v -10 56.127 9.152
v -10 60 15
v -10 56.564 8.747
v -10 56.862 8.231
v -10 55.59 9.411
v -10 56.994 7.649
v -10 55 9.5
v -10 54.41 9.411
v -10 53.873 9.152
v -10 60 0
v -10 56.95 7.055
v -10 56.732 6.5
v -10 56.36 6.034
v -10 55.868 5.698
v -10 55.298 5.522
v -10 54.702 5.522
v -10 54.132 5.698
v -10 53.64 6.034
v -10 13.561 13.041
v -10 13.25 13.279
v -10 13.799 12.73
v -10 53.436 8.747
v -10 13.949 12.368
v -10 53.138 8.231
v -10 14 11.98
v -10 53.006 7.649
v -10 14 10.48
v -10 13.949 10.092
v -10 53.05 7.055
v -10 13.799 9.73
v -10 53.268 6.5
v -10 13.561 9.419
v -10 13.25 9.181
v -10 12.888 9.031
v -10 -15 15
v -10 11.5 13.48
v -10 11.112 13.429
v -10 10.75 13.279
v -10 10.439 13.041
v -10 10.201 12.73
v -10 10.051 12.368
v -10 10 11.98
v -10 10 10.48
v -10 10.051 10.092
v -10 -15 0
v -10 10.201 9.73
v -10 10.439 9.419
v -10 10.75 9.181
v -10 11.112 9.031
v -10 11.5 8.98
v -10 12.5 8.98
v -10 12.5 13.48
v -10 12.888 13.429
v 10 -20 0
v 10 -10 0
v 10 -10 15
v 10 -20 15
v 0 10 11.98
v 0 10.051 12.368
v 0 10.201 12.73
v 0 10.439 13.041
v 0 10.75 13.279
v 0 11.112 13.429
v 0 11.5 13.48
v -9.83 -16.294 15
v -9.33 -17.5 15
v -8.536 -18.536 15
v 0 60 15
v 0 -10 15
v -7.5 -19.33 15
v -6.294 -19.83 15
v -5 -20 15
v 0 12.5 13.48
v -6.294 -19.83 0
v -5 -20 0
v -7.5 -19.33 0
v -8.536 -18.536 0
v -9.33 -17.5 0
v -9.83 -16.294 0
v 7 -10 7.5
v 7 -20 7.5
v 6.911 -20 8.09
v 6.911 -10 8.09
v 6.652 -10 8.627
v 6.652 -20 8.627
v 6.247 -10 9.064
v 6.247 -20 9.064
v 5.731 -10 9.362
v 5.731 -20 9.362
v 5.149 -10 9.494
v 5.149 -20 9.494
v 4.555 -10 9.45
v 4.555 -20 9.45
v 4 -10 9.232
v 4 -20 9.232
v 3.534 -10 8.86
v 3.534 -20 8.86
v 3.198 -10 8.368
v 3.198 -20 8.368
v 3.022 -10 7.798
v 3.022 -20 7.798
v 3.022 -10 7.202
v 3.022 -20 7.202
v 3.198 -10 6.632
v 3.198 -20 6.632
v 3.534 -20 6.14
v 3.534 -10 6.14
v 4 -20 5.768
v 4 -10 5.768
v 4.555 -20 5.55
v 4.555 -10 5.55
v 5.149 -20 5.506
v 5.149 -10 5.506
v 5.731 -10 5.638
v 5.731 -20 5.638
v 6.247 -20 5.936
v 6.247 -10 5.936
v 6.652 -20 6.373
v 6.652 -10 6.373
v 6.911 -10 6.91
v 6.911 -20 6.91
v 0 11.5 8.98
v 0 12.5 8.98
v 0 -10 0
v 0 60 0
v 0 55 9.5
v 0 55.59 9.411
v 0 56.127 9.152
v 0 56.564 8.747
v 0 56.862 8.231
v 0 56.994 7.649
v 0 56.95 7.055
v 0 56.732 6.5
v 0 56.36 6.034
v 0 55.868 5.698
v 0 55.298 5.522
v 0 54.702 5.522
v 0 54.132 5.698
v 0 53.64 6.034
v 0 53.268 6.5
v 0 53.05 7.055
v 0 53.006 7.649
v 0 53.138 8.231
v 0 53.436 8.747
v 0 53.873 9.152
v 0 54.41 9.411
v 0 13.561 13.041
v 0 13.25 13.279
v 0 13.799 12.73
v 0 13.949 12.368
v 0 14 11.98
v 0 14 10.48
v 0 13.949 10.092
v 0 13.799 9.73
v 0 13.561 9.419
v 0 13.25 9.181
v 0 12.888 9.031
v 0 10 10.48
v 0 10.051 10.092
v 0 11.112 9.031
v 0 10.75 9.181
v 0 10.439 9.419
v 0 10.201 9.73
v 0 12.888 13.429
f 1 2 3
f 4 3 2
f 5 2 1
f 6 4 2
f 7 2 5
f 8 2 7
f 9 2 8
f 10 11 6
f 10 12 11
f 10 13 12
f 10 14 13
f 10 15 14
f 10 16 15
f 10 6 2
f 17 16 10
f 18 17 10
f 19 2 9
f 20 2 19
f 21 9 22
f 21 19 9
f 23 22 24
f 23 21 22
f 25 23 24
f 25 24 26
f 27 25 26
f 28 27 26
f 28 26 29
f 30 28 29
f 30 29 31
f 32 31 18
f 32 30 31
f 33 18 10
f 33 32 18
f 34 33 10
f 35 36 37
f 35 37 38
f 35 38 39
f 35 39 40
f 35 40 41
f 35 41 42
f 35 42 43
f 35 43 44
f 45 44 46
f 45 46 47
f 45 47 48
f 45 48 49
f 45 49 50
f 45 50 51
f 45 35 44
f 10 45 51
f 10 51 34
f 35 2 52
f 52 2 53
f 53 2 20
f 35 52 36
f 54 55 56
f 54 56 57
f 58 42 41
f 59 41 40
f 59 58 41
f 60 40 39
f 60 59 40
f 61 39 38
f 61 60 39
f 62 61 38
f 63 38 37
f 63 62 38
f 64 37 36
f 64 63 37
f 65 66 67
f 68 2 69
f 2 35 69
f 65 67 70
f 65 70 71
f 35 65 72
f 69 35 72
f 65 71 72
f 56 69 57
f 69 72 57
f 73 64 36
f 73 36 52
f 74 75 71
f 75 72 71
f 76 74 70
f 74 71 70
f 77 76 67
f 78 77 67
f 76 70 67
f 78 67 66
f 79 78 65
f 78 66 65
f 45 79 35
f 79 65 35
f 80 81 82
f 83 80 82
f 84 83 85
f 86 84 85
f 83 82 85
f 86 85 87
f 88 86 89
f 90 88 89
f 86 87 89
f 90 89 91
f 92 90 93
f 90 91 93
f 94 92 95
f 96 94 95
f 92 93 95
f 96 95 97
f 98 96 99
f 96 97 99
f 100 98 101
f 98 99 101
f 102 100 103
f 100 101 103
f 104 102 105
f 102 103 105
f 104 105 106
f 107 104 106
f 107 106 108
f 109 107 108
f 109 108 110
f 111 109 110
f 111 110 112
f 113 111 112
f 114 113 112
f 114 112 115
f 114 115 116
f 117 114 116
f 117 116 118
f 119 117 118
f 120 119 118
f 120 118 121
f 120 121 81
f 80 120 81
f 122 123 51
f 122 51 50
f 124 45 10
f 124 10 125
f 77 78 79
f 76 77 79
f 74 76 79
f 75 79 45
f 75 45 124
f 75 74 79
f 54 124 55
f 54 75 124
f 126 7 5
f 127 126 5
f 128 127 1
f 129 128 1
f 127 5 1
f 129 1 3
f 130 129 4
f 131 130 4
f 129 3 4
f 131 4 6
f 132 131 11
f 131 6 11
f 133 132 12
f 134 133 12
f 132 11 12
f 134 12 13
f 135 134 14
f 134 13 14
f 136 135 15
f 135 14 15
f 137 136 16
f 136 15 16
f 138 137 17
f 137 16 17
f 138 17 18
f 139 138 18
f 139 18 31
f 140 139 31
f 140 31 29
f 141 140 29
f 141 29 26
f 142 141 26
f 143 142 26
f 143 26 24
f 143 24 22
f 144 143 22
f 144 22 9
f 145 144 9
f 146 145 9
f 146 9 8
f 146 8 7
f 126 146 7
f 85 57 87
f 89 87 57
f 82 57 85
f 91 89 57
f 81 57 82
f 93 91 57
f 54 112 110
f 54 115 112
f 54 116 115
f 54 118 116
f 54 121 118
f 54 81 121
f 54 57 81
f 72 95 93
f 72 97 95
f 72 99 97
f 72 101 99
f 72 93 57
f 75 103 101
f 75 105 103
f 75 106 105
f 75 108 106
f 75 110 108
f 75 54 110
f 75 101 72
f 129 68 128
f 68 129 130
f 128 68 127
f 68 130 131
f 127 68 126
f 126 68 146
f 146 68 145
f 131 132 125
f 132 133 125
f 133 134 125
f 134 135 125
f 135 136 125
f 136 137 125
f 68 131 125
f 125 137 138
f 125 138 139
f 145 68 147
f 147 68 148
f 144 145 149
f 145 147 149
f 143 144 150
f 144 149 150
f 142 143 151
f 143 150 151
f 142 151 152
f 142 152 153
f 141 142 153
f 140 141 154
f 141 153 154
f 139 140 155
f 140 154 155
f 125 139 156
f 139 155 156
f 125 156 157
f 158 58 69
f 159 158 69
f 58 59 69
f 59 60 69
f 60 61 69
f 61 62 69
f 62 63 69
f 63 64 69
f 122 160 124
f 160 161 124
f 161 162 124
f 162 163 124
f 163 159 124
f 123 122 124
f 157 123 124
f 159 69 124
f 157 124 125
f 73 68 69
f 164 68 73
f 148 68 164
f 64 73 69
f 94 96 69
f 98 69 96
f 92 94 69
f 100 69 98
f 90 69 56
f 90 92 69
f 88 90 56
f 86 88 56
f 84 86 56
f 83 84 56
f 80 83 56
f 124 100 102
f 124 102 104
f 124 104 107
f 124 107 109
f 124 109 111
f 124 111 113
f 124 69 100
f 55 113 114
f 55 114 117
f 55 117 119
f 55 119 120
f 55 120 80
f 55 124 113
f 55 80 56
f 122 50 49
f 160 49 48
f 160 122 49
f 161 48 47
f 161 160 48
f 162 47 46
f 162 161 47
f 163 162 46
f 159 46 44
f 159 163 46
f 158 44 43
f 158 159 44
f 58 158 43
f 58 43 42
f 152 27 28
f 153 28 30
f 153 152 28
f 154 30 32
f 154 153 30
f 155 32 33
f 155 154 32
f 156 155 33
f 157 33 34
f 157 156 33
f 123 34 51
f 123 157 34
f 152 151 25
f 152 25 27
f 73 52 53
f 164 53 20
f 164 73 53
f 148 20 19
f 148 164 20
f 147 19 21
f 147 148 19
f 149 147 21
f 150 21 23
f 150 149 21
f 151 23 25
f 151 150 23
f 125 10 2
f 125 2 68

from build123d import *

# Parameters (mm, degrees)
BOSS_EXTRUDE1_DEPTH = 15
FILLET1_R           = 5
SKETCH2_W           = 10
SKETCH2_H           = 15
BOSS_EXTRUDE2_DEPTH = 40
SKETCH3_R           = 2
CUT_EXTRUDE1_DEPTH  = 81
CUT_EXTRUDE2_DEPTH  = 11
SKETCH5_R           = 2
CUT_EXTRUDE3_DEPTH  = 21


with BuildPart() as part:
    # Sketch1 → Boss-Extrude1 (new body)
    with BuildSketch(Plane.XY):
        Polygon((0, 20), (0, -10), (10, -10), (10, -20), (-10, -20), (-10, 20), align=None)
    extrude(amount=BOSS_EXTRUDE1_DEPTH)

    # Fillet1
    fillet1_edges = [part.edges().sort_by_distance(p)[0] for p in [
        (-10, -20, 7.5),
    ]]
    fillet(fillet1_edges, radius=FILLET1_R)

    # Sketch2 → Boss-Extrude2 (add)
    with BuildSketch(Plane(origin=(0, 20, 0), x_dir=(1, 0, 0), z_dir=(0, 1, 0))):
        with Locations((-5, -7.5)):
            Rectangle(SKETCH2_W, SKETCH2_H)
    extrude(amount=BOSS_EXTRUDE2_DEPTH)

    # Sketch3 → Cut-Extrude1 (cut, through all)
    with BuildSketch(Plane.XZ.offset(20)):
        with Locations((5, 7.5)):
            Circle(SKETCH3_R)
    extrude(amount=-CUT_EXTRUDE1_DEPTH, mode=Mode.SUBTRACT)

    # Sketch4 → Cut-Extrude2 (cut, through all)
    with BuildSketch(Plane(origin=(0, 0, 0), x_dir=(0, 0, -1), z_dir=(1, 0, 0))):
        with BuildLine():
            Line((-10.48, 10), (-11.98, 10))
            ThreePointArc((-11.98, 10), (-13.040660172, 10.439339828), (-13.48, 11.5))
            Line((-13.48, 11.5), (-13.48, 12.5))
            ThreePointArc((-13.48, 12.5), (-13.040660172, 13.560660172), (-11.98, 14))
            Line((-11.98, 14), (-10.48, 14))
            ThreePointArc((-10.48, 14), (-9.419339828, 13.560660172), (-8.98, 12.5))
            Line((-8.98, 12.5), (-8.98, 11.5))
            ThreePointArc((-8.98, 11.5), (-9.419339828, 10.439339828), (-10.48, 10))
        make_face()
    extrude(amount=-CUT_EXTRUDE2_DEPTH, mode=Mode.SUBTRACT)

    # Sketch5 → Cut-Extrude3 (cut, through all)
    with BuildSketch(Plane.ZY.offset(10)):
        with Locations((7.5, 55)):
            Circle(SKETCH5_R)
    extrude(amount=-CUT_EXTRUDE3_DEPTH, mode=Mode.SUBTRACT)


solid = part.part
